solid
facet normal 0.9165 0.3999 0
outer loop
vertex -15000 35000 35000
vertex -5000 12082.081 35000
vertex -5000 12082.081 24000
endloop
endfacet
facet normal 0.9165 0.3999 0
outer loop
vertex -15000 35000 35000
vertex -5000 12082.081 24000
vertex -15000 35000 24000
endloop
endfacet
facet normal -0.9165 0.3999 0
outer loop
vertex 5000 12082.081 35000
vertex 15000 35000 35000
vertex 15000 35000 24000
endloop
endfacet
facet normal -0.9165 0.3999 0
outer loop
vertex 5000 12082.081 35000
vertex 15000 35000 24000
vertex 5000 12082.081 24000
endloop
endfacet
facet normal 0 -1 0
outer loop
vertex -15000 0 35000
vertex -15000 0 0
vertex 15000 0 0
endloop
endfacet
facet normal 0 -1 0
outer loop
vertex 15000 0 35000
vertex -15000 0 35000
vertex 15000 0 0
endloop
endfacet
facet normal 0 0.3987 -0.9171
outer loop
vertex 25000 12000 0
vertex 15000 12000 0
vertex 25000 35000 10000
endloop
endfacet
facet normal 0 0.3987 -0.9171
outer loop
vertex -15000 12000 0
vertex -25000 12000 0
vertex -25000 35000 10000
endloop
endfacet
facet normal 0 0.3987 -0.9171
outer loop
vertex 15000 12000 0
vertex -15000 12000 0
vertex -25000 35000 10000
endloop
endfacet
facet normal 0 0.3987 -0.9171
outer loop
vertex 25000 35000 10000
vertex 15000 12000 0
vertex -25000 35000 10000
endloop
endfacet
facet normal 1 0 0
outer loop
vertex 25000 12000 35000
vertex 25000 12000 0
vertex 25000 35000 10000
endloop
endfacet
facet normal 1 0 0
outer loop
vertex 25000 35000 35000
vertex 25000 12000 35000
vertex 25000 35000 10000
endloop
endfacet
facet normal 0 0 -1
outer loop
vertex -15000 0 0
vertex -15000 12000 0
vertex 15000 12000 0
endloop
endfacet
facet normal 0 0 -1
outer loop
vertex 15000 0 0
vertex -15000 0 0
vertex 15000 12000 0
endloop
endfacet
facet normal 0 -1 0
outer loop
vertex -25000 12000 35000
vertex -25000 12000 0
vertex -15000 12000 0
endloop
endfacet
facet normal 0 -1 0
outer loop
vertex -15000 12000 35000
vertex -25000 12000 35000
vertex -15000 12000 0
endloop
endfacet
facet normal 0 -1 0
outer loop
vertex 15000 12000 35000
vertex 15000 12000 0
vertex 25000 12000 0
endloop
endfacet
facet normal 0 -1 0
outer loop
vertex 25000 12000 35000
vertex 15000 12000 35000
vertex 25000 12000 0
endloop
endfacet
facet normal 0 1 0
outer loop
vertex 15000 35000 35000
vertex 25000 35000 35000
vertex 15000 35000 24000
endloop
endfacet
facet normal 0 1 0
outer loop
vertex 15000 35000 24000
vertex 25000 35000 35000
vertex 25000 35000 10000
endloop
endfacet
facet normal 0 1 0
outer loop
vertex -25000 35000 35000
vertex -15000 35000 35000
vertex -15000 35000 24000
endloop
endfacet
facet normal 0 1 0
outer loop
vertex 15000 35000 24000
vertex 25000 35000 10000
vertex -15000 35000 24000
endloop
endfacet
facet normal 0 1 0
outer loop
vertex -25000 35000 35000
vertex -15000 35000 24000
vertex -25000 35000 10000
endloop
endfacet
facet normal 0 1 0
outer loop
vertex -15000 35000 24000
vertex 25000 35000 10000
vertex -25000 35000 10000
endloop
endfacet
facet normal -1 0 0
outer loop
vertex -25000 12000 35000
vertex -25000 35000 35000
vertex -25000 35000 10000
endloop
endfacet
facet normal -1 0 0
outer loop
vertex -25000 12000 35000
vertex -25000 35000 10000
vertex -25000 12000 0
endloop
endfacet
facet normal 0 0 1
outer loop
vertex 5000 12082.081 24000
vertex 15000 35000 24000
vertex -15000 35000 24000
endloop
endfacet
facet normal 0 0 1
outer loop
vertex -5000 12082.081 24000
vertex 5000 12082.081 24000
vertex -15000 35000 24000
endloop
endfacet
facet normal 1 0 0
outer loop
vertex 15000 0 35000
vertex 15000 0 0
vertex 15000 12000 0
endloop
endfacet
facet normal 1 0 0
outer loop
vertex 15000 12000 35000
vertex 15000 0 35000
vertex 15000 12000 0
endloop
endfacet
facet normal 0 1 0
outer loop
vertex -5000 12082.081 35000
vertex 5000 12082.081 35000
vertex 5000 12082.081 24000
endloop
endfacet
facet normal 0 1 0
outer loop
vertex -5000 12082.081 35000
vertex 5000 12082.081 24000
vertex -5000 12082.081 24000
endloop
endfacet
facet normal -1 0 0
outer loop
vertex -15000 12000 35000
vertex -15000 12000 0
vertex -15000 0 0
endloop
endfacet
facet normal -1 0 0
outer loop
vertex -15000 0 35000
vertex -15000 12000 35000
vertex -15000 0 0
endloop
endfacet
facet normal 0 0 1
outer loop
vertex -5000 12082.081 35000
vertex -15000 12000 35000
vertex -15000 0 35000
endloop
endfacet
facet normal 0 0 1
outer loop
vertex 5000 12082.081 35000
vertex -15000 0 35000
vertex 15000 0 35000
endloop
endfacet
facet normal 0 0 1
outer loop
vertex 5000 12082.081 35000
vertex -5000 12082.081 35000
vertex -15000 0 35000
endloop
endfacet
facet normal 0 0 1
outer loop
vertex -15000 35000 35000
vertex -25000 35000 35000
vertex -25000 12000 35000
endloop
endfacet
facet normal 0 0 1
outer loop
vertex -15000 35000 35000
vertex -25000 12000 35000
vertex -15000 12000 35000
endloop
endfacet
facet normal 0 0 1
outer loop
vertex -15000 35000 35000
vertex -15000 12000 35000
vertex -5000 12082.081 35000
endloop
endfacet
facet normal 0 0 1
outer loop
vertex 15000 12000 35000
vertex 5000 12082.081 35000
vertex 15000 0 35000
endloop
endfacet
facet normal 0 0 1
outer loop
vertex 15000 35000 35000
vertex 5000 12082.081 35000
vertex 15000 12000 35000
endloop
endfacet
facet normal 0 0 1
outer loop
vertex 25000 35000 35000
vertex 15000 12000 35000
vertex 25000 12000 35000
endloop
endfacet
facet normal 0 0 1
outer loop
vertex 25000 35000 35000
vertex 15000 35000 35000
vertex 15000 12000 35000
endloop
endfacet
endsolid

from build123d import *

# Parameters (mm, degrees)
BOSS_EXTRUDE2_DEPTH = 35000
CUT_EXTRUDE1_DEPTH  = 11000
CUT_EXTRUDE2_DEPTH  = 70357.236397351


with BuildPart() as part:
    # Sketch3 → Boss-Extrude2 (new body)
    with BuildSketch(Plane.XY):
        Polygon((-15000, 0), (15000, 0), (15000, 12000), (25000, 12000), (25000, 35000), (-25000, 35000), (-25000, 12000), (-15000, 12000), align=None)
    extrude(amount=BOSS_EXTRUDE2_DEPTH)

    # Sketch4 → Cut-Extrude1 (cut)
    with BuildSketch(Plane.XY.offset(35000)):
        Polygon((-5000, 12082.081474439), (-15000, 35000), (15000, 35000), (5000, 12082.081474439), align=None)
    extrude(amount=-CUT_EXTRUDE1_DEPTH, mode=Mode.SUBTRACT)

    # Sketch6 → Cut-Extrude2 (cut, through all)
    with BuildSketch(Plane.ZY.offset(25000)):
        Polygon((0, 35000), (0, 12000), (10000, 35000), align=None)
    extrude(amount=-CUT_EXTRUDE2_DEPTH, mode=Mode.SUBTRACT)


solid = part.part
